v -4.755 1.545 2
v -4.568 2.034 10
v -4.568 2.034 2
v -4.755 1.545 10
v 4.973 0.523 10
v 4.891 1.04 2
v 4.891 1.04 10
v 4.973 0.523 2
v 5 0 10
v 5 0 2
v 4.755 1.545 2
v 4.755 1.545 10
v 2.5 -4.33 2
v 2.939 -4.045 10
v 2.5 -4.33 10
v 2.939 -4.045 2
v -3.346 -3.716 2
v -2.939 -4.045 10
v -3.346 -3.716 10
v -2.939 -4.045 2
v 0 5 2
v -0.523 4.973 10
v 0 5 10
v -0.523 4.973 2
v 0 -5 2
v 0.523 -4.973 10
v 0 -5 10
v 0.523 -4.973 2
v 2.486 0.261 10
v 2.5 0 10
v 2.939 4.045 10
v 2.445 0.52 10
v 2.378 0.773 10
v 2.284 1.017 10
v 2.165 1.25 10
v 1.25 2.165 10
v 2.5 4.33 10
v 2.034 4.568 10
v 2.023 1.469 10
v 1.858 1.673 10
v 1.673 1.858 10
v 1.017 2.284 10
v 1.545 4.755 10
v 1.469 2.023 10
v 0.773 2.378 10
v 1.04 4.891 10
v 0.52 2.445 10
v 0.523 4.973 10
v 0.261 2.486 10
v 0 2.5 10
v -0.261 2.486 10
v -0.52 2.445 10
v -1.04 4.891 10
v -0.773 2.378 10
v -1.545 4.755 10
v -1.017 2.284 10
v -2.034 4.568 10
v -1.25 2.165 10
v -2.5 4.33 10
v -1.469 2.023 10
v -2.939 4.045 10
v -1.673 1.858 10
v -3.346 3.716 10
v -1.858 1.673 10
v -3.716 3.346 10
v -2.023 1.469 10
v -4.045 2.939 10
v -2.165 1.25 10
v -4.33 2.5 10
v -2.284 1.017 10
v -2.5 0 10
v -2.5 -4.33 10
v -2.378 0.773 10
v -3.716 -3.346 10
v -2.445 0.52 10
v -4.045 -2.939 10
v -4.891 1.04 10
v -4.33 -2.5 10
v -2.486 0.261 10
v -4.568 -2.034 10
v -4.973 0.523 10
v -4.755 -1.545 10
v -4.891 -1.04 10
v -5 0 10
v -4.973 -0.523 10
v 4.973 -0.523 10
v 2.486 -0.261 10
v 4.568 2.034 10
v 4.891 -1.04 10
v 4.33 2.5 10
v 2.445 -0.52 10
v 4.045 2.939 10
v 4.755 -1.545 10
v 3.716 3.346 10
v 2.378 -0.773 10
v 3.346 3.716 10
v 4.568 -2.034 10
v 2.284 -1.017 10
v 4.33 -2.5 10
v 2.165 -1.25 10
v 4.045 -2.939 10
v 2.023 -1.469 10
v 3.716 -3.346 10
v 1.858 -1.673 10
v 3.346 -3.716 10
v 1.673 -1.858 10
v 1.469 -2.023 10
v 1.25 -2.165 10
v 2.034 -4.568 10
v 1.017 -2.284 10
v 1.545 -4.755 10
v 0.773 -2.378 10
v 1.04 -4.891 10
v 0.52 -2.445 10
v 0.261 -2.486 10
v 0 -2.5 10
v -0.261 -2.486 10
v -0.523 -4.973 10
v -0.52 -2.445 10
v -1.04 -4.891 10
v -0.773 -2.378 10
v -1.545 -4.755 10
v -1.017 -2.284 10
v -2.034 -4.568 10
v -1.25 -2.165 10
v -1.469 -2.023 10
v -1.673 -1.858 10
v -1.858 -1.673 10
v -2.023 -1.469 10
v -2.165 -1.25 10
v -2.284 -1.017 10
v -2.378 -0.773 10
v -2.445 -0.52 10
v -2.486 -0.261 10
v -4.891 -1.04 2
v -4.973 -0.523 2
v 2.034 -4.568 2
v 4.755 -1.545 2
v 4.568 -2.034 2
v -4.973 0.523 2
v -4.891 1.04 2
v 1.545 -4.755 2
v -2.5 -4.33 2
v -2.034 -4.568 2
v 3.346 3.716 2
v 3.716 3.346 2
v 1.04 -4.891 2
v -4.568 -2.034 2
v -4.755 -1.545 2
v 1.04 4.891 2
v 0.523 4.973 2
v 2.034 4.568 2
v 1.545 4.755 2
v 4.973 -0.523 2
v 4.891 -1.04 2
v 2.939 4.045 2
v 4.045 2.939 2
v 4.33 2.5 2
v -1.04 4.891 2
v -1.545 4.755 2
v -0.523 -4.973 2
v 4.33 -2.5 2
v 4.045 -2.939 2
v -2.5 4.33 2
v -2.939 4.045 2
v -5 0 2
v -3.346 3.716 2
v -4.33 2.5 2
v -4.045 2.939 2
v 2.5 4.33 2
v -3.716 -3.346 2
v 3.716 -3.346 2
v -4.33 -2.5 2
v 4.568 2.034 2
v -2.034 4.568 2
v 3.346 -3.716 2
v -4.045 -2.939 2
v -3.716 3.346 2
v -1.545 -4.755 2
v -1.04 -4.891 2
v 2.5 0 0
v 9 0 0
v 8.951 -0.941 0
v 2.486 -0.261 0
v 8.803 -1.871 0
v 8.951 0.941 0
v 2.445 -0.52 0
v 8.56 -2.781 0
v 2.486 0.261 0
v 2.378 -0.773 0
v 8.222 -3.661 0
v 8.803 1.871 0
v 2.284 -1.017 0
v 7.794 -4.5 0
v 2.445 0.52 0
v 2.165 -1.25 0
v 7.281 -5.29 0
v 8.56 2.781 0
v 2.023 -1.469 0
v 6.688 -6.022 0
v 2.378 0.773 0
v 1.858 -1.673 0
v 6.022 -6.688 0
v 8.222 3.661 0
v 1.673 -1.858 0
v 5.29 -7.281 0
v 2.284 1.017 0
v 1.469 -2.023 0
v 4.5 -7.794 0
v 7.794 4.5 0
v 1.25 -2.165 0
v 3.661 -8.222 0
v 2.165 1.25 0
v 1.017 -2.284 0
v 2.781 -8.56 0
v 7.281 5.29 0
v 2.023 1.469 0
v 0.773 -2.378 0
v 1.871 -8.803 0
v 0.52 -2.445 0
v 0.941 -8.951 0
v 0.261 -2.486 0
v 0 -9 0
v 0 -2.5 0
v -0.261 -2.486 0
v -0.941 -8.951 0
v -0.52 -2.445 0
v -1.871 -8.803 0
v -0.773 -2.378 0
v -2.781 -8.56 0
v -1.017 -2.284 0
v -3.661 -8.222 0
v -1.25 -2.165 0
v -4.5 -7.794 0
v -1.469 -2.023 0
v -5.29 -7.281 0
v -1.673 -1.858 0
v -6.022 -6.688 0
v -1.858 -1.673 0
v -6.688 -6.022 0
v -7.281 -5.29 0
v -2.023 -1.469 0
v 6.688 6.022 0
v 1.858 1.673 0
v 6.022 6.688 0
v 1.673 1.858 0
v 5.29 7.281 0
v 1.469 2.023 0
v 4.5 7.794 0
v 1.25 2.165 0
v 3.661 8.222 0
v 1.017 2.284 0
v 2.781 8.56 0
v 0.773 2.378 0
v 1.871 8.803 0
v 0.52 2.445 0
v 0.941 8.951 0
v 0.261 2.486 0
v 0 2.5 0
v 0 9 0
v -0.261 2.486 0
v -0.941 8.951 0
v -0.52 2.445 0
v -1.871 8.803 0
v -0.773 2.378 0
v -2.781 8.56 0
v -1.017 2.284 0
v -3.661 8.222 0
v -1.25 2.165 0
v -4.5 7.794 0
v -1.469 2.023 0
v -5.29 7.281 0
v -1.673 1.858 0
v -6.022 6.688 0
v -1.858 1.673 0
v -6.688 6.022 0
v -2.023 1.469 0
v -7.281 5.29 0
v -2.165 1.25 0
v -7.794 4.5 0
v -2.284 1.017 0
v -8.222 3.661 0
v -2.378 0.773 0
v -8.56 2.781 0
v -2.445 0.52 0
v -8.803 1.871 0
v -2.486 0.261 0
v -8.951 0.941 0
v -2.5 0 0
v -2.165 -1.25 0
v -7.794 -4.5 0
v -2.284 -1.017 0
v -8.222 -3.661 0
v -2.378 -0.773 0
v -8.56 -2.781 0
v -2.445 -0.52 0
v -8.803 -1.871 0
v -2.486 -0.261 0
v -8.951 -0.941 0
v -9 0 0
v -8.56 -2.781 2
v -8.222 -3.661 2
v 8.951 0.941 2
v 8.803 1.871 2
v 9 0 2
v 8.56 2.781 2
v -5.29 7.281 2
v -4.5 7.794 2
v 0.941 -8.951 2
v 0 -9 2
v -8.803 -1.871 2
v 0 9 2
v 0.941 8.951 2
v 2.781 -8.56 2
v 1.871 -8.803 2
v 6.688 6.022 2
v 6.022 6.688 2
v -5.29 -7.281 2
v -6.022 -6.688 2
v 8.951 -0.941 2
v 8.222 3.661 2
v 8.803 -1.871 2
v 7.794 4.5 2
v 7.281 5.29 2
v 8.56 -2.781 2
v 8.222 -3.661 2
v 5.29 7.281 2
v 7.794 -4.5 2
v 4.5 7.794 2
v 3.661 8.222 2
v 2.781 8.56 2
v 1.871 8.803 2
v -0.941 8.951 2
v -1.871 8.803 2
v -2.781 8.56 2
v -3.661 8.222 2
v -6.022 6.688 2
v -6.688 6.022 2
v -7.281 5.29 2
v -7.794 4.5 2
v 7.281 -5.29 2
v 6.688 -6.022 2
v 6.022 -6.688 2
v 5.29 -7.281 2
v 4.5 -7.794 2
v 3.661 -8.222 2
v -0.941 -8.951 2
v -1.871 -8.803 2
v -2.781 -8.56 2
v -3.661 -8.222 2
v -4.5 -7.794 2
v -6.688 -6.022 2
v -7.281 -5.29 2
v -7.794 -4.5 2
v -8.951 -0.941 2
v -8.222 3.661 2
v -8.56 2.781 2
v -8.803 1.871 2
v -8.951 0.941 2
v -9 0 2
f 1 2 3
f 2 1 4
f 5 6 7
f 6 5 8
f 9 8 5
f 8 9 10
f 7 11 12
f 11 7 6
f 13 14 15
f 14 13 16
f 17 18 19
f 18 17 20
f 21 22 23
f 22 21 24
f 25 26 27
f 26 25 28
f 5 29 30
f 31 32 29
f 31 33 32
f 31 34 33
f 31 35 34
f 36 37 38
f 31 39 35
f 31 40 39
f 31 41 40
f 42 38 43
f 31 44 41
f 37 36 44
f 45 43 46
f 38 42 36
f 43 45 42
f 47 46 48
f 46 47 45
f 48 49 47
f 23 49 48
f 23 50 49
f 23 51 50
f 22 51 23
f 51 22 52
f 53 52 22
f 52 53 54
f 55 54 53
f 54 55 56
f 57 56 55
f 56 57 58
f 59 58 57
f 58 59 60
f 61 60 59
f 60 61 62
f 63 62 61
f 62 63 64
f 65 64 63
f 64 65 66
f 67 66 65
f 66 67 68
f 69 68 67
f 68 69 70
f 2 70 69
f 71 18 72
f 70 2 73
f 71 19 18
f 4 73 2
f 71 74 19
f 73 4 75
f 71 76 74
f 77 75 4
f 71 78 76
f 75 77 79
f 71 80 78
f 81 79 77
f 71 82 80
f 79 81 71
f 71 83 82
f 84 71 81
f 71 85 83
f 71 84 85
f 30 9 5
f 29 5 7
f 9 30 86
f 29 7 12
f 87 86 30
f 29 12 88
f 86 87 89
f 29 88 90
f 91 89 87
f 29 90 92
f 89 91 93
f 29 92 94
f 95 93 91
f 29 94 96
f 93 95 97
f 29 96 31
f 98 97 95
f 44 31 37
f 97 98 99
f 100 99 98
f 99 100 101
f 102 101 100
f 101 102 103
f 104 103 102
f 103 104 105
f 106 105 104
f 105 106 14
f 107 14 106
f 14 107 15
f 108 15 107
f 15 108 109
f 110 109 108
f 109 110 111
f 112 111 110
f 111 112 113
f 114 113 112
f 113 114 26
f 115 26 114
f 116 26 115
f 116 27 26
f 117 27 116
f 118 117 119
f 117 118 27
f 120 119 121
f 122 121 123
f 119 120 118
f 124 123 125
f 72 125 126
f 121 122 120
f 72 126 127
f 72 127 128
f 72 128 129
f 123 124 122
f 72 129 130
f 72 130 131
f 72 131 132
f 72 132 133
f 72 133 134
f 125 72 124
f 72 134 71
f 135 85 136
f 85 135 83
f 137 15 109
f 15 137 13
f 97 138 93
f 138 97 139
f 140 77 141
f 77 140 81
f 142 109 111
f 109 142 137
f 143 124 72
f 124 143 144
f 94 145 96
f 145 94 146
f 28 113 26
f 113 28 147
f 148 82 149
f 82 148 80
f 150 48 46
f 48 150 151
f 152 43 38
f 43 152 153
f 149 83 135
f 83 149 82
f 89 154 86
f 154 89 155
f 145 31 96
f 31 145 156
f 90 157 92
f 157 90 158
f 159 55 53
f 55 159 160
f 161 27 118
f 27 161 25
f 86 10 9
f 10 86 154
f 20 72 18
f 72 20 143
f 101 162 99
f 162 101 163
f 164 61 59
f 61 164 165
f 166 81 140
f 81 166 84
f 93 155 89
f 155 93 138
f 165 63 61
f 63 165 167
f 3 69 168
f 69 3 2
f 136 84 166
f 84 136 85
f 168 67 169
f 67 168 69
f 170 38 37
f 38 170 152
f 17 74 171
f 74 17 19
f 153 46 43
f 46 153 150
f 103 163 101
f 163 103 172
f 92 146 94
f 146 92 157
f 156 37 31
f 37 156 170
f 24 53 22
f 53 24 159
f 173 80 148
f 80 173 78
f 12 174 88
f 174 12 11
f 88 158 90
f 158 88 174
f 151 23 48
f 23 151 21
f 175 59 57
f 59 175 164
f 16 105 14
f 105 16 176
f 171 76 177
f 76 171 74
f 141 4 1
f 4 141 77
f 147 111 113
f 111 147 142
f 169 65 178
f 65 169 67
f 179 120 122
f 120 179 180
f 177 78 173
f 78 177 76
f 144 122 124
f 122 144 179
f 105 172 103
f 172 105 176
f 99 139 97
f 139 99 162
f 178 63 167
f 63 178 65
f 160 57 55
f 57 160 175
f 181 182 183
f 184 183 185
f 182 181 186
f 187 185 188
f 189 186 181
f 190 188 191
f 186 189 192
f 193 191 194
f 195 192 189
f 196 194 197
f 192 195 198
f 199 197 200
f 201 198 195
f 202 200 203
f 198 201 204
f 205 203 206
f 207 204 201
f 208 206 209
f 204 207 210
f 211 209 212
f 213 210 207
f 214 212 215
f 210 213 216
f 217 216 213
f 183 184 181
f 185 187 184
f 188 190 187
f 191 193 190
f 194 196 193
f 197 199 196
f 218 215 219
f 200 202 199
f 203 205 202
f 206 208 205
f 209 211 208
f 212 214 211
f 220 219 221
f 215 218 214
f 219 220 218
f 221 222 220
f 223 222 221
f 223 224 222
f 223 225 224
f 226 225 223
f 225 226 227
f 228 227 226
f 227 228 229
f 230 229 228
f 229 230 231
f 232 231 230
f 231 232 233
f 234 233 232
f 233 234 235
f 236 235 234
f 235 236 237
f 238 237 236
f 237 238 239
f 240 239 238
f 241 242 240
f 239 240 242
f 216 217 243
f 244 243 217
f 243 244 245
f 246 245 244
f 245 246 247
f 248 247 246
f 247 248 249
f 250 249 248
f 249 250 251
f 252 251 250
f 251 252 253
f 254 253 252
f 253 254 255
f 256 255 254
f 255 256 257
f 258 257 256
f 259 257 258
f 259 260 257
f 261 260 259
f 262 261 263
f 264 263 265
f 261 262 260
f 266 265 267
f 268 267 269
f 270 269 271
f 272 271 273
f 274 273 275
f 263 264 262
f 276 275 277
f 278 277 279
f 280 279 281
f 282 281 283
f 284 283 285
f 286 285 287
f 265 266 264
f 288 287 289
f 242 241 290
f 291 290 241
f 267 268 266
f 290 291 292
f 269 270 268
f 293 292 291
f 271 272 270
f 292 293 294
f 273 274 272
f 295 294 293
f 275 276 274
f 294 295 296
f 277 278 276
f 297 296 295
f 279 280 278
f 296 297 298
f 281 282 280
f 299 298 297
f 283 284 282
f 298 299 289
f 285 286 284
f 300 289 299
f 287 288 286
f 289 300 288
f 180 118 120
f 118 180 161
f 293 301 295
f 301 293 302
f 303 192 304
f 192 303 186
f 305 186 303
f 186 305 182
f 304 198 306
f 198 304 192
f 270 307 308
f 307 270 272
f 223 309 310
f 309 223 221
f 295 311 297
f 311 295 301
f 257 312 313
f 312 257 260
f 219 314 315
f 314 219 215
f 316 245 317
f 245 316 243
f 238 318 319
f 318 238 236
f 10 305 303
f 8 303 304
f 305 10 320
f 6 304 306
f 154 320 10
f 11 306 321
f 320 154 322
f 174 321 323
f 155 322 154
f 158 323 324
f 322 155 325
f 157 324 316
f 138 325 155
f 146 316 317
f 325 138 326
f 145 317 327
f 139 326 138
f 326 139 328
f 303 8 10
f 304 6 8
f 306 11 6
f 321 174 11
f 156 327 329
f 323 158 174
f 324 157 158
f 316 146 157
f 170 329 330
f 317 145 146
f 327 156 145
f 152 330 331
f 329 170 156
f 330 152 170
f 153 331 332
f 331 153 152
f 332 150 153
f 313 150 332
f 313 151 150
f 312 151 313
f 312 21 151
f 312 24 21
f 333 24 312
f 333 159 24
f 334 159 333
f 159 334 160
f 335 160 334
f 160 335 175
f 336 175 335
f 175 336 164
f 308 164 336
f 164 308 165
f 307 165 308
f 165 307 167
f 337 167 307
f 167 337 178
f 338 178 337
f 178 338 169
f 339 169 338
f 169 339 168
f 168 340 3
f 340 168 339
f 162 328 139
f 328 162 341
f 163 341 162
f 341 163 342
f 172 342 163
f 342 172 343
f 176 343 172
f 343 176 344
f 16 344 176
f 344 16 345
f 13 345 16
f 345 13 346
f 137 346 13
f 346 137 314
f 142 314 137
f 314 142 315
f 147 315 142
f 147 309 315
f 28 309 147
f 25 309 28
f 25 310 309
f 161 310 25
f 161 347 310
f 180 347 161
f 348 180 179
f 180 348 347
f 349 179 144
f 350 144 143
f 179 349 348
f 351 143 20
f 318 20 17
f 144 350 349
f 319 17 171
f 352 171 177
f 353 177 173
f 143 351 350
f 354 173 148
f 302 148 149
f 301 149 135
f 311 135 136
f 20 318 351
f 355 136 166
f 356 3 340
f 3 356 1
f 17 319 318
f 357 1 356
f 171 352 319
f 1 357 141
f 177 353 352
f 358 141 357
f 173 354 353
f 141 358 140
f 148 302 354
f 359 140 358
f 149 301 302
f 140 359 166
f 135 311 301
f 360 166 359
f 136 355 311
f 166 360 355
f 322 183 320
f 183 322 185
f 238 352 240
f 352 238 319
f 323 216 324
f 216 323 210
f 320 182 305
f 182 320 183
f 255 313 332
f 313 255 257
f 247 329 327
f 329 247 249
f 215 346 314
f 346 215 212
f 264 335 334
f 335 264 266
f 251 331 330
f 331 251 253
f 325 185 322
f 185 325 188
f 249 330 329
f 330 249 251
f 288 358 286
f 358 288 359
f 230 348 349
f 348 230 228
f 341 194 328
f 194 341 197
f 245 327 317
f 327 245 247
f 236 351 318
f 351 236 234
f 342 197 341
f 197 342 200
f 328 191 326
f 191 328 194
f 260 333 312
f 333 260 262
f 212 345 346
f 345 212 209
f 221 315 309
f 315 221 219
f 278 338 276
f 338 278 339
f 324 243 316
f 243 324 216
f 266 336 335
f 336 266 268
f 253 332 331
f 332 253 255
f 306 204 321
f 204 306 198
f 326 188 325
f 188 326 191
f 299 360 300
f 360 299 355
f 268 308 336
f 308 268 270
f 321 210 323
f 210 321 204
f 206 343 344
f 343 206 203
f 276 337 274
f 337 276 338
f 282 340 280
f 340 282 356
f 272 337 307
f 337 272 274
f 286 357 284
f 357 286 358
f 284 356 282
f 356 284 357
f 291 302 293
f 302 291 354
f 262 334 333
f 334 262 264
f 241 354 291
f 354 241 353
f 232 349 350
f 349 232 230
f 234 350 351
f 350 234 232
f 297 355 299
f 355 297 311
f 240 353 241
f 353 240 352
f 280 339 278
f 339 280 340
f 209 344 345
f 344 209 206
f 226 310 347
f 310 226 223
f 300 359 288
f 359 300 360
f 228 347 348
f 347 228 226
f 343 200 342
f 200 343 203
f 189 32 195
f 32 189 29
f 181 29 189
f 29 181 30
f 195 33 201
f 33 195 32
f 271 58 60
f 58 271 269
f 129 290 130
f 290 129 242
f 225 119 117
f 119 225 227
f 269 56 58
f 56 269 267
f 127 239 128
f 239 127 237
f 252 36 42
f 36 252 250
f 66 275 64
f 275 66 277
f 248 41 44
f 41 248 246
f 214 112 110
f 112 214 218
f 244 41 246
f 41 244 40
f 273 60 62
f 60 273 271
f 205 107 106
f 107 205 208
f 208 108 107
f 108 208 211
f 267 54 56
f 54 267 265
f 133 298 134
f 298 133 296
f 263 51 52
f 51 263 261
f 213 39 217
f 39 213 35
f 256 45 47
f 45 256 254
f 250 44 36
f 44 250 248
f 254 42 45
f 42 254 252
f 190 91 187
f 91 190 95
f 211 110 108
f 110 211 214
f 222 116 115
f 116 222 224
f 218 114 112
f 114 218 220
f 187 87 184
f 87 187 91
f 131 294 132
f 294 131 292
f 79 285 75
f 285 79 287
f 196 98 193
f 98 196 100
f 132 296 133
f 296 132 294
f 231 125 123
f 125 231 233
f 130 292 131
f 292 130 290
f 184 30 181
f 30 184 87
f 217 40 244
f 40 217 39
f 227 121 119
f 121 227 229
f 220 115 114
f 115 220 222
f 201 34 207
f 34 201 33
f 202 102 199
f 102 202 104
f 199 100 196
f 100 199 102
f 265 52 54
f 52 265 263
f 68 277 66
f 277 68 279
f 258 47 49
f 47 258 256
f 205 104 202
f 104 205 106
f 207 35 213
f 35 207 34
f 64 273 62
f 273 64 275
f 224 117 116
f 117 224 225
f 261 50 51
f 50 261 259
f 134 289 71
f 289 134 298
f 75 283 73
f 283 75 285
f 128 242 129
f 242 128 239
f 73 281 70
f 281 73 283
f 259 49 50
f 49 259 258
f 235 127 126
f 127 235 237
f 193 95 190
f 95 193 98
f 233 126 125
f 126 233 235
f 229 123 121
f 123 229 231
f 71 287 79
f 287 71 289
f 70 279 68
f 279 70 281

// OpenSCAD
// Flanged spacer.
$fn = 60;
eps = 0.02;
inner_d = 5;
outer_d = 10;
length = 10;
flange_d = 18;
difference() { union() { cylinder(d=outer_d,h=length); cylinder(d=flange_d,h=2); } translate([0,0,-eps]) cylinder(d=inner_d,h=length+2*eps); }
